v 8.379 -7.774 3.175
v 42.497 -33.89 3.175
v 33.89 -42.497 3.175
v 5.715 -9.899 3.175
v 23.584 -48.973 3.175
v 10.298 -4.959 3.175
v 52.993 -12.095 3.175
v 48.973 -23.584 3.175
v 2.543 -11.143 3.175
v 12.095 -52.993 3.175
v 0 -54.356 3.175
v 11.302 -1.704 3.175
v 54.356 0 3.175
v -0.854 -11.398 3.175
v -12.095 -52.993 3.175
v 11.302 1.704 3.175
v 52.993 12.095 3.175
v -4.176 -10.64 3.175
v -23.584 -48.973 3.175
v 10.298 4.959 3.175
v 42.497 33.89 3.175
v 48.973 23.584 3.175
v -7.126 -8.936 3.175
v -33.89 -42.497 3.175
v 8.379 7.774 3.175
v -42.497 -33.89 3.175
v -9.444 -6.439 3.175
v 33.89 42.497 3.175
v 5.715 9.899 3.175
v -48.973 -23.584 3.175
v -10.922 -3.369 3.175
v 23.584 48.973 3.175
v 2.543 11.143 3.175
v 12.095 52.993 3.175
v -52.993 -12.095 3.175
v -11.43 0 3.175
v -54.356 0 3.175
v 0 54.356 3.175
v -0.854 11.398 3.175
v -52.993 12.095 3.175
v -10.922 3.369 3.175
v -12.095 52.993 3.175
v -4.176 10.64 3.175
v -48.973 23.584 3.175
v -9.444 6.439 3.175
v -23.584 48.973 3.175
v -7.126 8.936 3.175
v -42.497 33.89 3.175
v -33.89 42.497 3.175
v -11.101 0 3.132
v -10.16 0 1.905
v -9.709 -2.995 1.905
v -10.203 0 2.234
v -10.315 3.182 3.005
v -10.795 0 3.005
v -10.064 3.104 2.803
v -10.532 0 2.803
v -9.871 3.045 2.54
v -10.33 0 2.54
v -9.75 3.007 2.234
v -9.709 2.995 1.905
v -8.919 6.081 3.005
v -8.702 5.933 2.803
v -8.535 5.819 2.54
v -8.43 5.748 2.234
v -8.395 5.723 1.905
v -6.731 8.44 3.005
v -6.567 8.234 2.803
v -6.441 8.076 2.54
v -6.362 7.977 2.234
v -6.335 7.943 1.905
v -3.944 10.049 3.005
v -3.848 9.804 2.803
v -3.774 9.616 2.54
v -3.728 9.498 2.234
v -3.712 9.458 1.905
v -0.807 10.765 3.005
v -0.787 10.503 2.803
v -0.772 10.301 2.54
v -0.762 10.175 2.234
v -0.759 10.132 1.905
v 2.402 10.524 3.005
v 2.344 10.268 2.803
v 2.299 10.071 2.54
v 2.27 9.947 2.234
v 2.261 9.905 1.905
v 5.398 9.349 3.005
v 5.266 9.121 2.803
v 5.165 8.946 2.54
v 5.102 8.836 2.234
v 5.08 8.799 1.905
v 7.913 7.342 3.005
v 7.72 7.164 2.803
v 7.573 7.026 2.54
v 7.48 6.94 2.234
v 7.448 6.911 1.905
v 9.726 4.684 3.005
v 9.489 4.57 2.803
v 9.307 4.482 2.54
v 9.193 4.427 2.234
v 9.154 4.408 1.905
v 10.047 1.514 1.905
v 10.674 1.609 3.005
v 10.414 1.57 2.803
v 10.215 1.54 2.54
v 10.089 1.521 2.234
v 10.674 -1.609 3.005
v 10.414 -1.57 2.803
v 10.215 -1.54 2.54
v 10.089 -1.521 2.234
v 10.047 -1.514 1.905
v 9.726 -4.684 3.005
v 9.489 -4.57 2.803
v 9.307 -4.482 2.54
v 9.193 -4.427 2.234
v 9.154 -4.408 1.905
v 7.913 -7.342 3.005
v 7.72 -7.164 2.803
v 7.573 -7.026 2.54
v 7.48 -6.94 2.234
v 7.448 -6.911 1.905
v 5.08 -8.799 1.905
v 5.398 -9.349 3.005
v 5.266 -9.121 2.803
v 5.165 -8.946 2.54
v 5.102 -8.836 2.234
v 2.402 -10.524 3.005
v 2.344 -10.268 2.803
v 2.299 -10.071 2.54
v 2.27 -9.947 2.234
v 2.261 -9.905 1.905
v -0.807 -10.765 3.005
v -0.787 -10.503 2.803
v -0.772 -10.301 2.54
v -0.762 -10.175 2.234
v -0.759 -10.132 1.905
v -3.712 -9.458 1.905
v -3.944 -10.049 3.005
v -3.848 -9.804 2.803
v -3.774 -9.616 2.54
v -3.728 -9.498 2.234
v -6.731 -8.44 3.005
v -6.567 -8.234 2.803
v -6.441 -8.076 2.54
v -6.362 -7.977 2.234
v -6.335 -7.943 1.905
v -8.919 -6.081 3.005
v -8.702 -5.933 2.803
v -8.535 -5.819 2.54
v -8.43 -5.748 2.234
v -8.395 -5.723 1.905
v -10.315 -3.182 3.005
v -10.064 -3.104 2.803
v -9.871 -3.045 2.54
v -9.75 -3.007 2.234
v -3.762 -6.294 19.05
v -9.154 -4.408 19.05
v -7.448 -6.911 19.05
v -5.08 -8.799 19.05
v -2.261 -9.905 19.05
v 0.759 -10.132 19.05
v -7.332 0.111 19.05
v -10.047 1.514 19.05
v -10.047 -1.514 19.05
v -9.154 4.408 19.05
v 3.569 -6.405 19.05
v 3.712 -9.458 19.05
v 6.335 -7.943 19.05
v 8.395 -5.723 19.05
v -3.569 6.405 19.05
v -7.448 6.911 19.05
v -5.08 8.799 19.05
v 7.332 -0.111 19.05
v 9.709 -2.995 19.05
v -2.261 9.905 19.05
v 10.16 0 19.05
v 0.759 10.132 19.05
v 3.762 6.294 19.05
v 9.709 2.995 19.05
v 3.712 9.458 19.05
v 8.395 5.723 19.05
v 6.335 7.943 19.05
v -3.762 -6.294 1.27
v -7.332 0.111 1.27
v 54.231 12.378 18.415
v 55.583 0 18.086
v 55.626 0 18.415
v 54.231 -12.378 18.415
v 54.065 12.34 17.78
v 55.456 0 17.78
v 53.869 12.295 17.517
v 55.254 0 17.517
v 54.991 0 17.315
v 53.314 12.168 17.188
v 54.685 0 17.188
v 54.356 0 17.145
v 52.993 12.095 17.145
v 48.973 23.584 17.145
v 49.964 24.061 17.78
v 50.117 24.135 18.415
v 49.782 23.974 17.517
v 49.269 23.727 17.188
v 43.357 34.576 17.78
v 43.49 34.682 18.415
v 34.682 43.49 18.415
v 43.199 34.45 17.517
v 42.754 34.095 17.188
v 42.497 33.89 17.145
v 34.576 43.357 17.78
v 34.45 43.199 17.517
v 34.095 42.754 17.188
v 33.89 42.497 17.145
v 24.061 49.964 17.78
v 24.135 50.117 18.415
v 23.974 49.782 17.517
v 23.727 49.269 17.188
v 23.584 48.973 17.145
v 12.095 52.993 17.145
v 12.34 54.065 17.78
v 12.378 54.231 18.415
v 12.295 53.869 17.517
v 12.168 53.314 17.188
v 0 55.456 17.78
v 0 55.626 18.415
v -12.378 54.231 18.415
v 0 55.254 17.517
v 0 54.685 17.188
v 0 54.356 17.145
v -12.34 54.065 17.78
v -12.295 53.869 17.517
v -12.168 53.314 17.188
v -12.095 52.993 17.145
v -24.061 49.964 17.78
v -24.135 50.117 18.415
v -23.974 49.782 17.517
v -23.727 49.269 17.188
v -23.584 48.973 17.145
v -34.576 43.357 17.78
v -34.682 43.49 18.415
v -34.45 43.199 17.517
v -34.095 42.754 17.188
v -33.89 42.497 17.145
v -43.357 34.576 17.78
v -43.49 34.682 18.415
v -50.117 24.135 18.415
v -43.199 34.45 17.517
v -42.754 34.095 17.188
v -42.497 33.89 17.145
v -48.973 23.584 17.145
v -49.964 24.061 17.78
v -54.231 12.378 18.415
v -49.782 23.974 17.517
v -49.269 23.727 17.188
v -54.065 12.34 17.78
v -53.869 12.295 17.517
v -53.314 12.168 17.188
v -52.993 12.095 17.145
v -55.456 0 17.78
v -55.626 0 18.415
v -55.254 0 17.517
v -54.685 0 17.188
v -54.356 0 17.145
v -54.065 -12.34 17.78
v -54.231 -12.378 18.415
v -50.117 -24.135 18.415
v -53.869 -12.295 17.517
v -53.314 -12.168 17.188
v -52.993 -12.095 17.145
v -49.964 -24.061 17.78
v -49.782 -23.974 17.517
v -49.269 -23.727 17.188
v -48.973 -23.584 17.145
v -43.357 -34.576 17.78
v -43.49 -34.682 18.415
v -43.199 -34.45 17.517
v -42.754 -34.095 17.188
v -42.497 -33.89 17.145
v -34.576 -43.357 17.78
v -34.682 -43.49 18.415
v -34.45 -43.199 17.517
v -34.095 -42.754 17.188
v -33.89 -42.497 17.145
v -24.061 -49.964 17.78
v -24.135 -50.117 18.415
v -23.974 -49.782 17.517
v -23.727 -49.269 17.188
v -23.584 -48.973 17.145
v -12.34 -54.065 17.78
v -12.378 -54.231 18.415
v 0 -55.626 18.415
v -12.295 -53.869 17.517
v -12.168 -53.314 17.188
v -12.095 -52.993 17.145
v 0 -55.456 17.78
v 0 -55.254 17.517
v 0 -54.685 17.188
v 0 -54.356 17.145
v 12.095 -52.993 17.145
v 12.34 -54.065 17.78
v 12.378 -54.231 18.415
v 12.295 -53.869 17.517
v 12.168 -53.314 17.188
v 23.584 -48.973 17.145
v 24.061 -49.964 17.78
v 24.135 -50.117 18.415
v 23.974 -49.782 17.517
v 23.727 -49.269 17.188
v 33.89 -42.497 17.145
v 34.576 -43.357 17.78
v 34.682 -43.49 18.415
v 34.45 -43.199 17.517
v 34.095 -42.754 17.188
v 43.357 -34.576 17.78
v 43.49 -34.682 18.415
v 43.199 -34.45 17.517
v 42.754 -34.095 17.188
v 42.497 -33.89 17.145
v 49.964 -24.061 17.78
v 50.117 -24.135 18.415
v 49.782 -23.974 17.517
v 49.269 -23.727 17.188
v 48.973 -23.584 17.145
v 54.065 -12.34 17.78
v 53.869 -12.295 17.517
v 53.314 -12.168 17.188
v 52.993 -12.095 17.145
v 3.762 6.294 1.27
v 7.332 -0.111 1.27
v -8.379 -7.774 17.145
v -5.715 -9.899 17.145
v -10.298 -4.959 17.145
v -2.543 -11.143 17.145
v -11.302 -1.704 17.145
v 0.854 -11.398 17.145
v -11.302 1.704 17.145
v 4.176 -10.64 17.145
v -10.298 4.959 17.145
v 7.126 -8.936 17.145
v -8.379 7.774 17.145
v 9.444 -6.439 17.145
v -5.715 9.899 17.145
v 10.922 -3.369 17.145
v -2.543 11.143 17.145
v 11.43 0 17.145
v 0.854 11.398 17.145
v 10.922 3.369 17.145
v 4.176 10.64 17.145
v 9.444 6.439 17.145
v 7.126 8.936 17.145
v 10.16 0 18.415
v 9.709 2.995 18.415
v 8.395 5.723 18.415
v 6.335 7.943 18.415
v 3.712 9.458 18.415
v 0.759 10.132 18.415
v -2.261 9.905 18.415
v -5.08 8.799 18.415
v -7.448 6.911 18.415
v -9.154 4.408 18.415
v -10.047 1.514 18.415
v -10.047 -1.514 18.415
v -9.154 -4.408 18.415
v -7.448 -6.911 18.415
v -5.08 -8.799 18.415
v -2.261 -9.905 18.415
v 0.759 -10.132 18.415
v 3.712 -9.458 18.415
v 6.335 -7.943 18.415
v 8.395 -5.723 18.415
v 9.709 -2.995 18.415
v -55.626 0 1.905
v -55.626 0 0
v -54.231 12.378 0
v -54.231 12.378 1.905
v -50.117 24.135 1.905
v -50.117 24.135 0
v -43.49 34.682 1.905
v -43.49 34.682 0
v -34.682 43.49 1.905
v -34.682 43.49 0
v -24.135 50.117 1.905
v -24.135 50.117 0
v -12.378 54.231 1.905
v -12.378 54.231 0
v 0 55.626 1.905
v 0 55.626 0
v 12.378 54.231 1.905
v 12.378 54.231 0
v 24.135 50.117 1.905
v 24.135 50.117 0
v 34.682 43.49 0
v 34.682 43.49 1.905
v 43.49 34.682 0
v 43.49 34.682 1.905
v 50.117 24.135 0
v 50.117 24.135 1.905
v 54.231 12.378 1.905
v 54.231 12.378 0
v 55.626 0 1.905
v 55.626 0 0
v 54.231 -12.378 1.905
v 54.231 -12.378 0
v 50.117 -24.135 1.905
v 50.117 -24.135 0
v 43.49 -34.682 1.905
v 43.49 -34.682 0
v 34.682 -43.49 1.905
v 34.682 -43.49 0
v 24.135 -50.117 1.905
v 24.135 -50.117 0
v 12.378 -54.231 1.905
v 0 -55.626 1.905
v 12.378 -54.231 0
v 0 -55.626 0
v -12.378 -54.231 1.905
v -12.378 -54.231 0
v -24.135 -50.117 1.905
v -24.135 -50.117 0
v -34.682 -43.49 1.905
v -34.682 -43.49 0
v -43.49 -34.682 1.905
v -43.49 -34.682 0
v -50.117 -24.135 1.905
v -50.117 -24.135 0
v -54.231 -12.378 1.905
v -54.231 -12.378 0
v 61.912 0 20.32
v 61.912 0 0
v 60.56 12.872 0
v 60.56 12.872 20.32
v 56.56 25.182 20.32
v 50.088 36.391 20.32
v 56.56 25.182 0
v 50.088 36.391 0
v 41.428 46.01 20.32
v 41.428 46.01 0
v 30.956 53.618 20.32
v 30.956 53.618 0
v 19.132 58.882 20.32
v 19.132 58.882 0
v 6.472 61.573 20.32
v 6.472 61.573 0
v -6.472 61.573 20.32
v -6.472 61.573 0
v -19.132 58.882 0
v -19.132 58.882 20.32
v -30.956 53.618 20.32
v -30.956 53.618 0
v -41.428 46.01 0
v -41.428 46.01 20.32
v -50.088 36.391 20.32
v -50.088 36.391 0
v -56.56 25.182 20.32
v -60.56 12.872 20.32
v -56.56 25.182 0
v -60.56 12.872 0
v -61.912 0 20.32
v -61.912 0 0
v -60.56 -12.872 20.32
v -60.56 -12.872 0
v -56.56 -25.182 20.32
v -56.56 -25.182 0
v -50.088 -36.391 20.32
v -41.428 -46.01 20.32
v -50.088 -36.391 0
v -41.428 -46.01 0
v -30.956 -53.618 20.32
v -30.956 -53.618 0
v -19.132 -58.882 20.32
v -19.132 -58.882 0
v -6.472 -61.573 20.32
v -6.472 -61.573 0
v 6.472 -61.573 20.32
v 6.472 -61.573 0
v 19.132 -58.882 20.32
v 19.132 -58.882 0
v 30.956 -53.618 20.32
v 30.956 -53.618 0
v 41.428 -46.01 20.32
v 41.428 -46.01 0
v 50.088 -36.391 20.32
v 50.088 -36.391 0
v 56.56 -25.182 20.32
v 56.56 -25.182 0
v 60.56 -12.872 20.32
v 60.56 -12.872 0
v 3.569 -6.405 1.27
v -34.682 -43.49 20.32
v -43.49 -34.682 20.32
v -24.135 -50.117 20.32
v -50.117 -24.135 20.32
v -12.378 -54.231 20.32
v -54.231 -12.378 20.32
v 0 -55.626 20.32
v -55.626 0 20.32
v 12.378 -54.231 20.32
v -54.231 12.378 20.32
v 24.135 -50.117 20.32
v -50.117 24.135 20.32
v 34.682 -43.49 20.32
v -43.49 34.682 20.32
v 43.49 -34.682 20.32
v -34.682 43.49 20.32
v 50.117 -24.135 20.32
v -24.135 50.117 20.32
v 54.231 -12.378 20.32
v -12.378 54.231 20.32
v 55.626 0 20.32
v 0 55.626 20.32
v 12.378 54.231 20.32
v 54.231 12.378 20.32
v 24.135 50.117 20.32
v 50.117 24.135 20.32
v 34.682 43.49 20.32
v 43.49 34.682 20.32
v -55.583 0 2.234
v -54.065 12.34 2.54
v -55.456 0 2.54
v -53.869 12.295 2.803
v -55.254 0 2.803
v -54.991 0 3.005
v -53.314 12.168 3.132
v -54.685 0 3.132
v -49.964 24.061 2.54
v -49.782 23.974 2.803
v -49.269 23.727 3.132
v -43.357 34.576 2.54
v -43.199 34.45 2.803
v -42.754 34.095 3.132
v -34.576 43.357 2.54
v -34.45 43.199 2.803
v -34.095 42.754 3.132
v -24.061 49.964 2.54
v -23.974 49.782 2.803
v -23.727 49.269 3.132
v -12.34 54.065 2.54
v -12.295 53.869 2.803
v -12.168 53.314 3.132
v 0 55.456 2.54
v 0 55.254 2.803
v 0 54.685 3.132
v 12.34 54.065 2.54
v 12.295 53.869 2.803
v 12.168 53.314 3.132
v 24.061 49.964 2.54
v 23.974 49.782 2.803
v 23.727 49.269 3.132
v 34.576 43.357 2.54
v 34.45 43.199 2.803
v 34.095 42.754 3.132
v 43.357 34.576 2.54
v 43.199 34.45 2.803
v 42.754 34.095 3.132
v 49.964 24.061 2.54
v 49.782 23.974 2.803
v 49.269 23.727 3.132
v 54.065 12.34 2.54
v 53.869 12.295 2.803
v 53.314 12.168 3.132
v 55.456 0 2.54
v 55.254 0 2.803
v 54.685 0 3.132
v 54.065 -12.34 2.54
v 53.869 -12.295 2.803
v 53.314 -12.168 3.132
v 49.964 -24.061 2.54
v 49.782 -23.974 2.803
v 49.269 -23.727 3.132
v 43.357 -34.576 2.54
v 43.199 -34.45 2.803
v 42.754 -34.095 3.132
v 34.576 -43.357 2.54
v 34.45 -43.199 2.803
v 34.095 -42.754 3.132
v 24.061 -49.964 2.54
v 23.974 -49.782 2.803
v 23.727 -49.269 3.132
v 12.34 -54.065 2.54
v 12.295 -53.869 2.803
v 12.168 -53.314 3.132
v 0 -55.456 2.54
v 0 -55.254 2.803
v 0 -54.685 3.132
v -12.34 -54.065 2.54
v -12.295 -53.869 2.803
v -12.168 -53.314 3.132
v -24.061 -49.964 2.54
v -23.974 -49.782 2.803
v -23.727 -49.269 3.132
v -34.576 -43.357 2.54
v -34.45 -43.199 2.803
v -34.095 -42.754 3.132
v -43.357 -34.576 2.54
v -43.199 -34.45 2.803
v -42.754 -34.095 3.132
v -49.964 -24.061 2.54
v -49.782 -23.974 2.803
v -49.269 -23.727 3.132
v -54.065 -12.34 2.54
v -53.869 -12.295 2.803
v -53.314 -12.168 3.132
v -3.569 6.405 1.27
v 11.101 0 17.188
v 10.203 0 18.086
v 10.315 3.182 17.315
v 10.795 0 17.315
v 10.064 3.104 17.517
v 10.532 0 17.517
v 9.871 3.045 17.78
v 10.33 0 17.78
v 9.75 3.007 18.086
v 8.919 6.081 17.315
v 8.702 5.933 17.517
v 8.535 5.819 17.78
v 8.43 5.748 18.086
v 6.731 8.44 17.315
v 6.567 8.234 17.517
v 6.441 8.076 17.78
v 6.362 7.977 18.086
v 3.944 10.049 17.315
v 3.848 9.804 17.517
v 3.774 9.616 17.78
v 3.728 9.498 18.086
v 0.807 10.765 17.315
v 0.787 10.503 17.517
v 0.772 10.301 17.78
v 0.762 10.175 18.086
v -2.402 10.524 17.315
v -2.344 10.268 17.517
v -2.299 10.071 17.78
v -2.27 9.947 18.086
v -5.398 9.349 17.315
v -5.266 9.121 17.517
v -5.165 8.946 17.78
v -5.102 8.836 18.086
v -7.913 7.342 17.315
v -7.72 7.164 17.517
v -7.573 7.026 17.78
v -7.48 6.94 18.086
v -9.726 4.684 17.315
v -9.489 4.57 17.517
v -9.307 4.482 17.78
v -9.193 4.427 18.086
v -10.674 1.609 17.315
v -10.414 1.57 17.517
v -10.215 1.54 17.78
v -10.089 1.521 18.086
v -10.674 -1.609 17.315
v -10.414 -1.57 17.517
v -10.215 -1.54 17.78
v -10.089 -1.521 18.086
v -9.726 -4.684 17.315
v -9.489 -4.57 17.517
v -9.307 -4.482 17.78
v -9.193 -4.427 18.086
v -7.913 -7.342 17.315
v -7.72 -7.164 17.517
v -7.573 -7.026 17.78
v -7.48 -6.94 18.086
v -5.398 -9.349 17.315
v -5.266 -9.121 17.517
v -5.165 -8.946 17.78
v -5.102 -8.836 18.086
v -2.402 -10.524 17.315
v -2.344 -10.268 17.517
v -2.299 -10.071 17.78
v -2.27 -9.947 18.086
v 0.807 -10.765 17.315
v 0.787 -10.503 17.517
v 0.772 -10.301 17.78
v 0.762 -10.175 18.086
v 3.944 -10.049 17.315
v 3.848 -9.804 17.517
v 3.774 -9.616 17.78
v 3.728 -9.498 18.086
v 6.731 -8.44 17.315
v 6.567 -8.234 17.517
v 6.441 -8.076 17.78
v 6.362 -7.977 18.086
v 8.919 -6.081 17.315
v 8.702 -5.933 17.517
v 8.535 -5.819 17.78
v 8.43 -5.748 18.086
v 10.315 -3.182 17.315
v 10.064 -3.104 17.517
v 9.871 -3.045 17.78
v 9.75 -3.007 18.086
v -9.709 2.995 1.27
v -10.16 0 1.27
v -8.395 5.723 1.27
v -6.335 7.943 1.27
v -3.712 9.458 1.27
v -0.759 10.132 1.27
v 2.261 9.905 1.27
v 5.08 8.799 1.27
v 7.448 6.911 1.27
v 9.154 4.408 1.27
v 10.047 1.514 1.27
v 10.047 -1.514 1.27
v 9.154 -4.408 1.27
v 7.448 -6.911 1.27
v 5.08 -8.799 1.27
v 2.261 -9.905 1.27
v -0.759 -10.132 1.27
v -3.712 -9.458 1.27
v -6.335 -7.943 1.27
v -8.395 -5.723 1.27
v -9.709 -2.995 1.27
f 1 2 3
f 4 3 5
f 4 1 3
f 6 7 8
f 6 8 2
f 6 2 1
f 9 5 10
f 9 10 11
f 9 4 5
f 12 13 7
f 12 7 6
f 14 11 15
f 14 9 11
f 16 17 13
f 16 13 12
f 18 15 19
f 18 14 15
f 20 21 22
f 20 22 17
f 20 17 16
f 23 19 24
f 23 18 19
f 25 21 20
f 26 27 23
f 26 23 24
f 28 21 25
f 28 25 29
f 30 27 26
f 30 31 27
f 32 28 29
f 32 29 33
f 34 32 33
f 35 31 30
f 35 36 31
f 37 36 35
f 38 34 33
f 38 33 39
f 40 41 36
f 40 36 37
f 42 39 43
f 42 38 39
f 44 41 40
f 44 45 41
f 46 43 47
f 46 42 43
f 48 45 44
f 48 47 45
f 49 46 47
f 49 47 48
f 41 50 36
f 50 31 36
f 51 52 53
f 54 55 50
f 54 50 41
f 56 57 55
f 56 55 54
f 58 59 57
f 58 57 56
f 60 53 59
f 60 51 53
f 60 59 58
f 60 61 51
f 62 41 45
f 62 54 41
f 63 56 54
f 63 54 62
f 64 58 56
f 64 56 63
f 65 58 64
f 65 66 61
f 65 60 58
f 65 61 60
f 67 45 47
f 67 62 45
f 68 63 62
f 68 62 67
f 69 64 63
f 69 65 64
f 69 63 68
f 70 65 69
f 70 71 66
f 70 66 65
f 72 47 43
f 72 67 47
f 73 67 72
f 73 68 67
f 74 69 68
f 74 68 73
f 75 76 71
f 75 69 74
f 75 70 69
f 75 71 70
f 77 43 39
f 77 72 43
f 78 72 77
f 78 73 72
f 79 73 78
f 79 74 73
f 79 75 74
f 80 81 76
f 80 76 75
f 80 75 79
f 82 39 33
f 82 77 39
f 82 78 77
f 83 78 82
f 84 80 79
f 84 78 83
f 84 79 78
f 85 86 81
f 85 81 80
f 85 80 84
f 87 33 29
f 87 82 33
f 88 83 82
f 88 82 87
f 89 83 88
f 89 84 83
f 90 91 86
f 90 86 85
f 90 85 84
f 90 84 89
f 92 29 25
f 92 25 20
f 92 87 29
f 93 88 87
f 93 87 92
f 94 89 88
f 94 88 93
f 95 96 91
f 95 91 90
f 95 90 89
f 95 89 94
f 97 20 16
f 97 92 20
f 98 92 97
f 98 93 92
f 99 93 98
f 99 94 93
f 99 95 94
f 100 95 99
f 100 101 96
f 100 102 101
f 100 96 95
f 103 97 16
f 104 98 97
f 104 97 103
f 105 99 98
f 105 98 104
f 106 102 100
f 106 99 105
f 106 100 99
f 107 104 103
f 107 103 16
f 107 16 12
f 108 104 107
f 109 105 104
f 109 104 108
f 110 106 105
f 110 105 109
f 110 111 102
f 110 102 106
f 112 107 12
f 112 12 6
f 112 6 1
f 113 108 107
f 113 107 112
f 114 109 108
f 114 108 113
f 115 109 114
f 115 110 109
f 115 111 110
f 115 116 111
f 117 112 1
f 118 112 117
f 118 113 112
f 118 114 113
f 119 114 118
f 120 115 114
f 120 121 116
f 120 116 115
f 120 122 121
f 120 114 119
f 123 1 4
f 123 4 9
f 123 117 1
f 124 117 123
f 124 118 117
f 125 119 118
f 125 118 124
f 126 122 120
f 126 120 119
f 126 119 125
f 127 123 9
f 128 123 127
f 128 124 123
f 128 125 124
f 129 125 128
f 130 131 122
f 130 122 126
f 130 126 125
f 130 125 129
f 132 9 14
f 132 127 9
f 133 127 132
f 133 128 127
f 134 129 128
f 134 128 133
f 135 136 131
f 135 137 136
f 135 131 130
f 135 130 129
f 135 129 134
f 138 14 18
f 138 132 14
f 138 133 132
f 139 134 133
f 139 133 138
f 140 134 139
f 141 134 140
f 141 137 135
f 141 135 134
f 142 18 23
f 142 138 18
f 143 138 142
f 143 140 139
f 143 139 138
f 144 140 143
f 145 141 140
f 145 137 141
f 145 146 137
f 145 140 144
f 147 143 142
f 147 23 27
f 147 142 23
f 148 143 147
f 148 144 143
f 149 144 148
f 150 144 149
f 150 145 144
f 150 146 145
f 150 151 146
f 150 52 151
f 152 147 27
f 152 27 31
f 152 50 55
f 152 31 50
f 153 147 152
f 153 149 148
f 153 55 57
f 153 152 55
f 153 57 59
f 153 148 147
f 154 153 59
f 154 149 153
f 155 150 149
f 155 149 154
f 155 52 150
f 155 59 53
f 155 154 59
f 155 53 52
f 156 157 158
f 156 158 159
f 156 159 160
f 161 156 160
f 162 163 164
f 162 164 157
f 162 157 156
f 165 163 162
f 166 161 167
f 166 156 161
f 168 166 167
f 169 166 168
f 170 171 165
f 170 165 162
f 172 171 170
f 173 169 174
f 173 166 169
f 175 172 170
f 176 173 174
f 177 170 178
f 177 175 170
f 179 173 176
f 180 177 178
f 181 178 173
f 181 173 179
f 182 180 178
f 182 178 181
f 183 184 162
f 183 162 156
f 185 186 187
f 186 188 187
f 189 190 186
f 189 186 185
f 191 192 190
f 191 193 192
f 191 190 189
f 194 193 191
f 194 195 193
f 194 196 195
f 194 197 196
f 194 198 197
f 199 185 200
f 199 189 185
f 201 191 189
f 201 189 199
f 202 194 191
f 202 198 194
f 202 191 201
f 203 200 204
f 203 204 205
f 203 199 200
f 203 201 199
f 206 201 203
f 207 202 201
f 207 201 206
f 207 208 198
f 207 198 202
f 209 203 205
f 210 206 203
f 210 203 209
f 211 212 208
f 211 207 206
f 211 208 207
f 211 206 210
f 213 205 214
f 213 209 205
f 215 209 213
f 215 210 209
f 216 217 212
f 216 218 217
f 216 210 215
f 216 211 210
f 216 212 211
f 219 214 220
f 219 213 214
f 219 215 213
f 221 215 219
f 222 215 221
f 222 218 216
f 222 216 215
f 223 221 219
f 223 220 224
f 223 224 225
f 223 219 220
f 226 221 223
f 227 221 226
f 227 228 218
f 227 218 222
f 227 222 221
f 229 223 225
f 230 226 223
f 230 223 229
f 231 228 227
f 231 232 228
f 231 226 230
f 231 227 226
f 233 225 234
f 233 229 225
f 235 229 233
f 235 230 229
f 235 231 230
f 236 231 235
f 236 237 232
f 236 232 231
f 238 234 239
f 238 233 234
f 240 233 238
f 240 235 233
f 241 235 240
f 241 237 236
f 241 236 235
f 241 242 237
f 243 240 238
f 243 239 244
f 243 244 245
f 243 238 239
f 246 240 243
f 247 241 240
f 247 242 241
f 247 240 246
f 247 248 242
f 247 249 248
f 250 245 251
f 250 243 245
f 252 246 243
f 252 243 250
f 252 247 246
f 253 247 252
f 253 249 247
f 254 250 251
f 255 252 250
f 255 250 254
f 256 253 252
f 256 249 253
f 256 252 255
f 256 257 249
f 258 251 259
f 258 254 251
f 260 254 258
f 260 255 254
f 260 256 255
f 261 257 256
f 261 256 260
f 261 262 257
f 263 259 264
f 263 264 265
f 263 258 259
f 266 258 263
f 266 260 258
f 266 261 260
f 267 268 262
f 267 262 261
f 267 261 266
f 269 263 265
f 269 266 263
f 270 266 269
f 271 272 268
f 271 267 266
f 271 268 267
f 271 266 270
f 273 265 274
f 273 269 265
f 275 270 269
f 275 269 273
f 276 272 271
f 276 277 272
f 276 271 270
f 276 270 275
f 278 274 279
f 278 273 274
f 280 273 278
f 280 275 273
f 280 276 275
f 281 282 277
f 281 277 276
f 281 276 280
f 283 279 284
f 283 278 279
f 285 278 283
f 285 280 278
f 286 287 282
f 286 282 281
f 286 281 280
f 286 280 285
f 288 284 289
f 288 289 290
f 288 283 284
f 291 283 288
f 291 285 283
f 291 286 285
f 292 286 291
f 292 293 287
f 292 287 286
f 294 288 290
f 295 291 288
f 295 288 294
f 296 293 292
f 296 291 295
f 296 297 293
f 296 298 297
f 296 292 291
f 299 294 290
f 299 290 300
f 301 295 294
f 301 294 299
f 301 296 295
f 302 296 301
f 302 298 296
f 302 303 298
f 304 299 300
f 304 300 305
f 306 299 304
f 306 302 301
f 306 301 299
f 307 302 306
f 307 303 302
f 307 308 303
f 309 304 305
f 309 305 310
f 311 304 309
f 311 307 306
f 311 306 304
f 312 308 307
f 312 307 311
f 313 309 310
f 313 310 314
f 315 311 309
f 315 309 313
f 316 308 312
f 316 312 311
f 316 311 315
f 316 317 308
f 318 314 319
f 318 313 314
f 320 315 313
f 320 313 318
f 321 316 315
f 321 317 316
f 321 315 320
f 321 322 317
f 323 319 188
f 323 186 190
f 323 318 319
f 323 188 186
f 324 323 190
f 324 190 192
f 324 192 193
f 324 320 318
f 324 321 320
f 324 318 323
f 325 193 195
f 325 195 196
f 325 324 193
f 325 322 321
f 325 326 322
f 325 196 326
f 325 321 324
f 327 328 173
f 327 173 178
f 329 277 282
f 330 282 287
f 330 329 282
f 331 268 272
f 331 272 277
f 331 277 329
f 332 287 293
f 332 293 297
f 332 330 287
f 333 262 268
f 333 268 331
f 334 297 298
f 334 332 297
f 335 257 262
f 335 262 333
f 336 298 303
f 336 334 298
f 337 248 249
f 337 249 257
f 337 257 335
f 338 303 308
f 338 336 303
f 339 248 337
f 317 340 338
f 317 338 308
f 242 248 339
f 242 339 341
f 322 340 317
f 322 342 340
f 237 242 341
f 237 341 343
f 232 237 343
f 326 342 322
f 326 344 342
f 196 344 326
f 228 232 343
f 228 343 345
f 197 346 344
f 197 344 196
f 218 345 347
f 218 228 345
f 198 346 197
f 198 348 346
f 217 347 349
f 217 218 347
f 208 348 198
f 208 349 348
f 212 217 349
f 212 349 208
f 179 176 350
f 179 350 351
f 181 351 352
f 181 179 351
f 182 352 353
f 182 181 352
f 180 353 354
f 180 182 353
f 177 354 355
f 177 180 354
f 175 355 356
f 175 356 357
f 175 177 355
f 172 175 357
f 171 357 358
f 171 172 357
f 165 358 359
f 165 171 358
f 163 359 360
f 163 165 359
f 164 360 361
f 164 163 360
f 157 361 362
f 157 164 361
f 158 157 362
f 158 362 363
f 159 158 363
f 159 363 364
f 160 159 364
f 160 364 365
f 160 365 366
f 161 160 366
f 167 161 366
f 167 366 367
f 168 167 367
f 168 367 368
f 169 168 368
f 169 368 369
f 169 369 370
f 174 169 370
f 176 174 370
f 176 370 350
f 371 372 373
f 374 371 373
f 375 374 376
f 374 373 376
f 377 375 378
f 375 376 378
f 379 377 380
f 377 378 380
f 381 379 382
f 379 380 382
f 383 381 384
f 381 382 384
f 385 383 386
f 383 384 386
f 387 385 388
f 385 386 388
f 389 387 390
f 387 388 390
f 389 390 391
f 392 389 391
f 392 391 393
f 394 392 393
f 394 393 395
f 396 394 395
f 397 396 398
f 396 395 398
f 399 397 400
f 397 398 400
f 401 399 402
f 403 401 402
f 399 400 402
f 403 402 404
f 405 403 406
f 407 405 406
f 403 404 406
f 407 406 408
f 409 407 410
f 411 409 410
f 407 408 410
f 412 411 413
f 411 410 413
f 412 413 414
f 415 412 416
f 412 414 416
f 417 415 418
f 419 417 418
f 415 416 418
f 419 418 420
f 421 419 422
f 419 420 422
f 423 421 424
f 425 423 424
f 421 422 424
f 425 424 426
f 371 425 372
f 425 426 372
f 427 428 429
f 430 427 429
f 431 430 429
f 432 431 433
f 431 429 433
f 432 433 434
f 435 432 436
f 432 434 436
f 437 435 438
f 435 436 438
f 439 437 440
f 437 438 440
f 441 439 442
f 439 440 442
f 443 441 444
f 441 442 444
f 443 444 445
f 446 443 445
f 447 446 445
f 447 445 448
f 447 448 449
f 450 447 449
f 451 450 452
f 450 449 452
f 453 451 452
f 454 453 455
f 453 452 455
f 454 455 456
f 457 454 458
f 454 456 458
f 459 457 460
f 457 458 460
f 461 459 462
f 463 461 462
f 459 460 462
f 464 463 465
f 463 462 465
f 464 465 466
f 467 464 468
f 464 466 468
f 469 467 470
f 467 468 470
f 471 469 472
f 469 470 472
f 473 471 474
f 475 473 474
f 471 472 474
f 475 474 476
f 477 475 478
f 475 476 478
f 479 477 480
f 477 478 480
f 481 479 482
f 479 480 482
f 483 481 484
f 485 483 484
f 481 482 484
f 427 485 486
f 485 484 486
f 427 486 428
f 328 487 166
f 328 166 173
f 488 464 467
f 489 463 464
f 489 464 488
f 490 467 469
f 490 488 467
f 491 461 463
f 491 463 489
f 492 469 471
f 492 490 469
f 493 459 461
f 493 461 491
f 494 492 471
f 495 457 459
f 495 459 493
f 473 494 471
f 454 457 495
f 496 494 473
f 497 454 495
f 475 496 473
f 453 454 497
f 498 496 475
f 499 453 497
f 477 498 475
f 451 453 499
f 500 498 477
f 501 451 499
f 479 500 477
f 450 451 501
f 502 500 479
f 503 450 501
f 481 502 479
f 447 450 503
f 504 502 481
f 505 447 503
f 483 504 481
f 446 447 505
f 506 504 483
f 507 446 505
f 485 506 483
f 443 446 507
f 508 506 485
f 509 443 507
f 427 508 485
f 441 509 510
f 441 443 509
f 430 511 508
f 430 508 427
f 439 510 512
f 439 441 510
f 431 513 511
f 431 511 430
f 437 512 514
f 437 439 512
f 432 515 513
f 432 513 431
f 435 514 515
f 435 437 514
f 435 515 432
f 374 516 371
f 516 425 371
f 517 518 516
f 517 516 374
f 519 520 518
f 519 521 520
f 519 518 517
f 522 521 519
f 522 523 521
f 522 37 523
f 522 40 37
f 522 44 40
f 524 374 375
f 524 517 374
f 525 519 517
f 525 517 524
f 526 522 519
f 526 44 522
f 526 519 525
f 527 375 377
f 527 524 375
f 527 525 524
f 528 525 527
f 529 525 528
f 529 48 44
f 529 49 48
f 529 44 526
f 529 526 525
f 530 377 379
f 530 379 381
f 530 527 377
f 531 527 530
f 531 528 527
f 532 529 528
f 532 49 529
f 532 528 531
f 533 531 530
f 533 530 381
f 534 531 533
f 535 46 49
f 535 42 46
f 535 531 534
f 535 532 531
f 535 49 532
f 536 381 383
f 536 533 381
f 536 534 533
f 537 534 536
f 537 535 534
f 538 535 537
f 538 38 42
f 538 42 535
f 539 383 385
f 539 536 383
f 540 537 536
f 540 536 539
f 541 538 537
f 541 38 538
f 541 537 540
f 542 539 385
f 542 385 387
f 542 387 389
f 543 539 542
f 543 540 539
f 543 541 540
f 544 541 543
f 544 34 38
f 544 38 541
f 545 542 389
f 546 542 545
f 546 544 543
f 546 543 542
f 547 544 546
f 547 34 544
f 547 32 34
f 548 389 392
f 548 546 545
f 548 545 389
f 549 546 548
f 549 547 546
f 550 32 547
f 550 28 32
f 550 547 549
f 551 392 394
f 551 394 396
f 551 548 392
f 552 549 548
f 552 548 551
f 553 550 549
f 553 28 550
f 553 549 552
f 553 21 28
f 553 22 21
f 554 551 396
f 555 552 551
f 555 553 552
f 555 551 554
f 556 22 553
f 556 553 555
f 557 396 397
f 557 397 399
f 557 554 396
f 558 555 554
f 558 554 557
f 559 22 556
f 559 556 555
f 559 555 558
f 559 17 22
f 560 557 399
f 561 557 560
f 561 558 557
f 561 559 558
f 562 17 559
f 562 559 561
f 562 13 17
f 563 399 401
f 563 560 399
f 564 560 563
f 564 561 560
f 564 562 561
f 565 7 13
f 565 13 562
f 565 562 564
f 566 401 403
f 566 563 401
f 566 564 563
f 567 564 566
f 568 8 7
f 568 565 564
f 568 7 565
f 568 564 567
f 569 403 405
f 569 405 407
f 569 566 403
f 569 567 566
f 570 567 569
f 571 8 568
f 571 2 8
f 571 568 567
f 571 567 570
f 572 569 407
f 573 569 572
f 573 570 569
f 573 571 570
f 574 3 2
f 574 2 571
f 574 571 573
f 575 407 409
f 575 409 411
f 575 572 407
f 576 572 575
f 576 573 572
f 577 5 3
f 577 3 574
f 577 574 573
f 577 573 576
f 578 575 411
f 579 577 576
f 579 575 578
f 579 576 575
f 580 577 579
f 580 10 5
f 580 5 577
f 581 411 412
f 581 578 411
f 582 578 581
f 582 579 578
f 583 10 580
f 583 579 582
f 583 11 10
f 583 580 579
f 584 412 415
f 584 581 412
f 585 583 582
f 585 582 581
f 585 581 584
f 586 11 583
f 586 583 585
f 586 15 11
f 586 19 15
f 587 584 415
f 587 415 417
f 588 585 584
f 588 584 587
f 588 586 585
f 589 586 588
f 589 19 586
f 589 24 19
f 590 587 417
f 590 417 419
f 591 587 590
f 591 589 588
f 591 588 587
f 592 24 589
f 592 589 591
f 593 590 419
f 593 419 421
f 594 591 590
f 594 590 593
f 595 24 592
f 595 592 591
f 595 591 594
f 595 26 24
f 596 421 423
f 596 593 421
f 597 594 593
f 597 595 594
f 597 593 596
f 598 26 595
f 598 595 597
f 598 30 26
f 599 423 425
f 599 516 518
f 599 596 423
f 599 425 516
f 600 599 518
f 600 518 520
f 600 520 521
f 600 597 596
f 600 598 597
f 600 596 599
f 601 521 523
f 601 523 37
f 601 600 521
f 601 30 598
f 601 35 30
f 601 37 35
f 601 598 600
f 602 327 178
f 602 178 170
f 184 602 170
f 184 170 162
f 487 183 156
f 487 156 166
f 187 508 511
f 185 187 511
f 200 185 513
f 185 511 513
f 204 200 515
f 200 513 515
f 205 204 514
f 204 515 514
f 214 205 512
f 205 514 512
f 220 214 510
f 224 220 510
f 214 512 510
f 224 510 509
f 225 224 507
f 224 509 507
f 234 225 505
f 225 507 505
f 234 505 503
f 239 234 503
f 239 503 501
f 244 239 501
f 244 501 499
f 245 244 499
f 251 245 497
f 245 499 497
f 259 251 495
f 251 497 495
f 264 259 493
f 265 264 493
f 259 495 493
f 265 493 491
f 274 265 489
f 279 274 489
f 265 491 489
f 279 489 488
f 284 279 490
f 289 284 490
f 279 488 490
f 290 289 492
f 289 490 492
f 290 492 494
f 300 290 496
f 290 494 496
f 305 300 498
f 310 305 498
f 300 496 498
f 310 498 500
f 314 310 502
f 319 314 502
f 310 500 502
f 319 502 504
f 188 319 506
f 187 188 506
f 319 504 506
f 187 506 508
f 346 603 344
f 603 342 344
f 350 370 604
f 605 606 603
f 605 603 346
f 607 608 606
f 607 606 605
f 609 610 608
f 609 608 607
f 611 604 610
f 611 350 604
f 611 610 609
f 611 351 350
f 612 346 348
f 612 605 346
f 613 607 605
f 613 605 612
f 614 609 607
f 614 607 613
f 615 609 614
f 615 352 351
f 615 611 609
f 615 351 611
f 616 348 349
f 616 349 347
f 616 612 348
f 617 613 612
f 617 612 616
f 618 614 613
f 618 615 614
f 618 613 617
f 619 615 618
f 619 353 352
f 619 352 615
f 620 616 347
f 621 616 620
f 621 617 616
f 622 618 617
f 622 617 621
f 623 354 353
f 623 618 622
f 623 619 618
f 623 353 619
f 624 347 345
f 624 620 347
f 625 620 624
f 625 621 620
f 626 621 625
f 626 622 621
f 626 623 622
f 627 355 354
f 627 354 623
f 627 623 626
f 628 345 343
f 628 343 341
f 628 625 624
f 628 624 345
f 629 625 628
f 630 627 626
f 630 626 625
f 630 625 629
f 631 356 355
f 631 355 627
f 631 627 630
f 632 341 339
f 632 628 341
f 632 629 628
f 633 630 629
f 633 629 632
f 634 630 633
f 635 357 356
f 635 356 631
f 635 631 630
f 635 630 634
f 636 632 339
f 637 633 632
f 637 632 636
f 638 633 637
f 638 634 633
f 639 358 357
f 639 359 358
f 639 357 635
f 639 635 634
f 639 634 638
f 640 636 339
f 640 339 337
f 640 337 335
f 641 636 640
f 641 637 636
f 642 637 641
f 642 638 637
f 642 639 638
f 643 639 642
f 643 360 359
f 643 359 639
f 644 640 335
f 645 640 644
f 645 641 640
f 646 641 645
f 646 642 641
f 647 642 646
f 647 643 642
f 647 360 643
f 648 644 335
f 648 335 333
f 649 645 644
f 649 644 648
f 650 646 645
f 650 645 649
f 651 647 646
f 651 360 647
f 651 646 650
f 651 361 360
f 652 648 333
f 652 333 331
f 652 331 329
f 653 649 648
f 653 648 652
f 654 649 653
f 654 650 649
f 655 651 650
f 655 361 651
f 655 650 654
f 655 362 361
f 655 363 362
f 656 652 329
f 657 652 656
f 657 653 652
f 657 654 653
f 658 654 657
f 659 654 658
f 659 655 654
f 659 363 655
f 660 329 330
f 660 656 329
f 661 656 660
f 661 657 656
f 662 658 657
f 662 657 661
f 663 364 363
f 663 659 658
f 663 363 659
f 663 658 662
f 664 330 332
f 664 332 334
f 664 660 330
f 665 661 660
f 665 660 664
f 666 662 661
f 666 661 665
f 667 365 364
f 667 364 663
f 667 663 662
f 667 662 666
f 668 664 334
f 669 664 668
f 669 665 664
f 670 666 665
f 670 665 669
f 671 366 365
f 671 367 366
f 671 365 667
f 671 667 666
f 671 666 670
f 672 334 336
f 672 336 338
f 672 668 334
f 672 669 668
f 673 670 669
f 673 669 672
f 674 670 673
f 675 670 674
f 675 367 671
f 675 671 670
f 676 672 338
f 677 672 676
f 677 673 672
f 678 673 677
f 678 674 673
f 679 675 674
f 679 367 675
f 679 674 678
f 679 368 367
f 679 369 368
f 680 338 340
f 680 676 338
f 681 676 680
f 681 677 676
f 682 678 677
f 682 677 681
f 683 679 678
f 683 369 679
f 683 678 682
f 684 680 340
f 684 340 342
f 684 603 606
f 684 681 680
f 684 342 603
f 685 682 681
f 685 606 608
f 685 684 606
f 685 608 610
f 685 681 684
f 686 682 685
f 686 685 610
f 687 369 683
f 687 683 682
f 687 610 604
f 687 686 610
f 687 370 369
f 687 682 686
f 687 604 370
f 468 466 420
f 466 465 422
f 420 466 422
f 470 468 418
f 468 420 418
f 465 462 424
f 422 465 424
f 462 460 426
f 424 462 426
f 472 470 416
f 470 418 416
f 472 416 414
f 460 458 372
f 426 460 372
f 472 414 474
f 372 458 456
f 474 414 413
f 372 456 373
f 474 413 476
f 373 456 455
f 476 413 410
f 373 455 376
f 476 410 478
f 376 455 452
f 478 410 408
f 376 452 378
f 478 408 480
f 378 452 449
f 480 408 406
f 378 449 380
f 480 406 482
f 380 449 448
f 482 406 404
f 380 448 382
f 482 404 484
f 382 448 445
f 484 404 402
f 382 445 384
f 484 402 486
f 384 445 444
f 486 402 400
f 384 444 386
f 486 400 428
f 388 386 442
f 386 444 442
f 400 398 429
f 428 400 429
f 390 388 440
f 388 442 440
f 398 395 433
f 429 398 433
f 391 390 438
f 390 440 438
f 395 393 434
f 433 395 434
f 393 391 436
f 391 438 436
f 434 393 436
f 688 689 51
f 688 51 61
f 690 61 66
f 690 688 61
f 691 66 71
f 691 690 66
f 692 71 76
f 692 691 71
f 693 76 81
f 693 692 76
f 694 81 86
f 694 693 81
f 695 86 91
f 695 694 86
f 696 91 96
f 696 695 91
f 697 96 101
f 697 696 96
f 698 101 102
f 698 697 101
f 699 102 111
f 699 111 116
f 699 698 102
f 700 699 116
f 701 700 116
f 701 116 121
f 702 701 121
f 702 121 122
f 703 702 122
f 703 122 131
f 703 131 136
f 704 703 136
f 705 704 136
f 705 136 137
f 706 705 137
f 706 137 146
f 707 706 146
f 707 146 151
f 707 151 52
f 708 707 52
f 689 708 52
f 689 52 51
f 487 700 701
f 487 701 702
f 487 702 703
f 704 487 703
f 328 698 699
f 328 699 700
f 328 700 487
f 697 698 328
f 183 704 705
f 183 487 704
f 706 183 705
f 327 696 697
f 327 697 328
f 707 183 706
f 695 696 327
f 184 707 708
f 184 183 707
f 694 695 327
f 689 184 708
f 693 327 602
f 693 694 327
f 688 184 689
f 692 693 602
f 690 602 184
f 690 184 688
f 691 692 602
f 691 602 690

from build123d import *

# Parameters (mm, degrees)
SKETCH1_R           = 61.9125
BOSS_EXTRUDE1_DEPTH = 20.32
SKETCH2_R           = 55.626
SKETCH2_R_2         = 10.16
CUT_EXTRUDE1_DEPTH  = 3.175
SKETCH3_R           = 55.626
SKETCH3_R_2         = 10.16
CUT_EXTRUDE2_DEPTH  = 3.175
SKETCH4_R           = 10.16
CUT_EXTRUDE3_DEPTH  = 1.27
SKETCH7_R           = 10.16
CUT_EXTRUDE5_DEPTH  = 1.27
FILLET1_R           = 1.27


with BuildPart() as part:
    # Sketch1 → Boss-Extrude1 (new body)
    with BuildSketch(Plane.XY):
        Circle(SKETCH1_R)
        Polygon((3.569234353, -6.4049902), (7.331501401, -0.111447478), (3.762267048, 6.293542722), (-3.569234353, 6.4049902), (-7.331501401, 0.111447478), (-3.762267048, -6.293542722), align=None, mode=Mode.SUBTRACT)
    extrude(amount=BOSS_EXTRUDE1_DEPTH)

    # Sketch2 → Cut-Extrude1 (cut)
    with BuildSketch(Plane.XY.offset(20.32)):
        Circle(SKETCH2_R)
        Circle(SKETCH2_R_2, mode=Mode.SUBTRACT)
    extrude(amount=-CUT_EXTRUDE1_DEPTH, mode=Mode.SUBTRACT)

    # Sketch3 → Cut-Extrude2 (cut)
    with BuildSketch(Plane(origin=(0, 0, 0), x_dir=(-1, 0, 0), z_dir=(0, 0, -1))):
        Circle(SKETCH3_R)
        Circle(SKETCH3_R_2, mode=Mode.SUBTRACT)
    extrude(amount=-CUT_EXTRUDE2_DEPTH, mode=Mode.SUBTRACT)

    # Sketch4 → Cut-Extrude3 (cut)
    with BuildSketch(Plane(origin=(0, 0, 0), x_dir=(-1, 0, 0), z_dir=(0, 0, -1))):
        Circle(SKETCH4_R)
    extrude(amount=-CUT_EXTRUDE3_DEPTH, mode=Mode.SUBTRACT)

    # Sketch7 → Cut-Extrude5 (cut)
    with BuildSketch(Plane.XY.offset(20.32)):
        Circle(SKETCH7_R)
    extrude(amount=-CUT_EXTRUDE5_DEPTH, mode=Mode.SUBTRACT)

    # Fillet1
    fillet1_edges = [part.edges().sort_by_distance(p)[0] for p in [
        (-55.626, 0, 17.145),
        (-10.16, 0, 17.145),
        (55.626, 0, 3.175),
        (10.16, 0, 3.175),
    ]]
    fillet(fillet1_edges, radius=FILLET1_R)


solid = part.part
